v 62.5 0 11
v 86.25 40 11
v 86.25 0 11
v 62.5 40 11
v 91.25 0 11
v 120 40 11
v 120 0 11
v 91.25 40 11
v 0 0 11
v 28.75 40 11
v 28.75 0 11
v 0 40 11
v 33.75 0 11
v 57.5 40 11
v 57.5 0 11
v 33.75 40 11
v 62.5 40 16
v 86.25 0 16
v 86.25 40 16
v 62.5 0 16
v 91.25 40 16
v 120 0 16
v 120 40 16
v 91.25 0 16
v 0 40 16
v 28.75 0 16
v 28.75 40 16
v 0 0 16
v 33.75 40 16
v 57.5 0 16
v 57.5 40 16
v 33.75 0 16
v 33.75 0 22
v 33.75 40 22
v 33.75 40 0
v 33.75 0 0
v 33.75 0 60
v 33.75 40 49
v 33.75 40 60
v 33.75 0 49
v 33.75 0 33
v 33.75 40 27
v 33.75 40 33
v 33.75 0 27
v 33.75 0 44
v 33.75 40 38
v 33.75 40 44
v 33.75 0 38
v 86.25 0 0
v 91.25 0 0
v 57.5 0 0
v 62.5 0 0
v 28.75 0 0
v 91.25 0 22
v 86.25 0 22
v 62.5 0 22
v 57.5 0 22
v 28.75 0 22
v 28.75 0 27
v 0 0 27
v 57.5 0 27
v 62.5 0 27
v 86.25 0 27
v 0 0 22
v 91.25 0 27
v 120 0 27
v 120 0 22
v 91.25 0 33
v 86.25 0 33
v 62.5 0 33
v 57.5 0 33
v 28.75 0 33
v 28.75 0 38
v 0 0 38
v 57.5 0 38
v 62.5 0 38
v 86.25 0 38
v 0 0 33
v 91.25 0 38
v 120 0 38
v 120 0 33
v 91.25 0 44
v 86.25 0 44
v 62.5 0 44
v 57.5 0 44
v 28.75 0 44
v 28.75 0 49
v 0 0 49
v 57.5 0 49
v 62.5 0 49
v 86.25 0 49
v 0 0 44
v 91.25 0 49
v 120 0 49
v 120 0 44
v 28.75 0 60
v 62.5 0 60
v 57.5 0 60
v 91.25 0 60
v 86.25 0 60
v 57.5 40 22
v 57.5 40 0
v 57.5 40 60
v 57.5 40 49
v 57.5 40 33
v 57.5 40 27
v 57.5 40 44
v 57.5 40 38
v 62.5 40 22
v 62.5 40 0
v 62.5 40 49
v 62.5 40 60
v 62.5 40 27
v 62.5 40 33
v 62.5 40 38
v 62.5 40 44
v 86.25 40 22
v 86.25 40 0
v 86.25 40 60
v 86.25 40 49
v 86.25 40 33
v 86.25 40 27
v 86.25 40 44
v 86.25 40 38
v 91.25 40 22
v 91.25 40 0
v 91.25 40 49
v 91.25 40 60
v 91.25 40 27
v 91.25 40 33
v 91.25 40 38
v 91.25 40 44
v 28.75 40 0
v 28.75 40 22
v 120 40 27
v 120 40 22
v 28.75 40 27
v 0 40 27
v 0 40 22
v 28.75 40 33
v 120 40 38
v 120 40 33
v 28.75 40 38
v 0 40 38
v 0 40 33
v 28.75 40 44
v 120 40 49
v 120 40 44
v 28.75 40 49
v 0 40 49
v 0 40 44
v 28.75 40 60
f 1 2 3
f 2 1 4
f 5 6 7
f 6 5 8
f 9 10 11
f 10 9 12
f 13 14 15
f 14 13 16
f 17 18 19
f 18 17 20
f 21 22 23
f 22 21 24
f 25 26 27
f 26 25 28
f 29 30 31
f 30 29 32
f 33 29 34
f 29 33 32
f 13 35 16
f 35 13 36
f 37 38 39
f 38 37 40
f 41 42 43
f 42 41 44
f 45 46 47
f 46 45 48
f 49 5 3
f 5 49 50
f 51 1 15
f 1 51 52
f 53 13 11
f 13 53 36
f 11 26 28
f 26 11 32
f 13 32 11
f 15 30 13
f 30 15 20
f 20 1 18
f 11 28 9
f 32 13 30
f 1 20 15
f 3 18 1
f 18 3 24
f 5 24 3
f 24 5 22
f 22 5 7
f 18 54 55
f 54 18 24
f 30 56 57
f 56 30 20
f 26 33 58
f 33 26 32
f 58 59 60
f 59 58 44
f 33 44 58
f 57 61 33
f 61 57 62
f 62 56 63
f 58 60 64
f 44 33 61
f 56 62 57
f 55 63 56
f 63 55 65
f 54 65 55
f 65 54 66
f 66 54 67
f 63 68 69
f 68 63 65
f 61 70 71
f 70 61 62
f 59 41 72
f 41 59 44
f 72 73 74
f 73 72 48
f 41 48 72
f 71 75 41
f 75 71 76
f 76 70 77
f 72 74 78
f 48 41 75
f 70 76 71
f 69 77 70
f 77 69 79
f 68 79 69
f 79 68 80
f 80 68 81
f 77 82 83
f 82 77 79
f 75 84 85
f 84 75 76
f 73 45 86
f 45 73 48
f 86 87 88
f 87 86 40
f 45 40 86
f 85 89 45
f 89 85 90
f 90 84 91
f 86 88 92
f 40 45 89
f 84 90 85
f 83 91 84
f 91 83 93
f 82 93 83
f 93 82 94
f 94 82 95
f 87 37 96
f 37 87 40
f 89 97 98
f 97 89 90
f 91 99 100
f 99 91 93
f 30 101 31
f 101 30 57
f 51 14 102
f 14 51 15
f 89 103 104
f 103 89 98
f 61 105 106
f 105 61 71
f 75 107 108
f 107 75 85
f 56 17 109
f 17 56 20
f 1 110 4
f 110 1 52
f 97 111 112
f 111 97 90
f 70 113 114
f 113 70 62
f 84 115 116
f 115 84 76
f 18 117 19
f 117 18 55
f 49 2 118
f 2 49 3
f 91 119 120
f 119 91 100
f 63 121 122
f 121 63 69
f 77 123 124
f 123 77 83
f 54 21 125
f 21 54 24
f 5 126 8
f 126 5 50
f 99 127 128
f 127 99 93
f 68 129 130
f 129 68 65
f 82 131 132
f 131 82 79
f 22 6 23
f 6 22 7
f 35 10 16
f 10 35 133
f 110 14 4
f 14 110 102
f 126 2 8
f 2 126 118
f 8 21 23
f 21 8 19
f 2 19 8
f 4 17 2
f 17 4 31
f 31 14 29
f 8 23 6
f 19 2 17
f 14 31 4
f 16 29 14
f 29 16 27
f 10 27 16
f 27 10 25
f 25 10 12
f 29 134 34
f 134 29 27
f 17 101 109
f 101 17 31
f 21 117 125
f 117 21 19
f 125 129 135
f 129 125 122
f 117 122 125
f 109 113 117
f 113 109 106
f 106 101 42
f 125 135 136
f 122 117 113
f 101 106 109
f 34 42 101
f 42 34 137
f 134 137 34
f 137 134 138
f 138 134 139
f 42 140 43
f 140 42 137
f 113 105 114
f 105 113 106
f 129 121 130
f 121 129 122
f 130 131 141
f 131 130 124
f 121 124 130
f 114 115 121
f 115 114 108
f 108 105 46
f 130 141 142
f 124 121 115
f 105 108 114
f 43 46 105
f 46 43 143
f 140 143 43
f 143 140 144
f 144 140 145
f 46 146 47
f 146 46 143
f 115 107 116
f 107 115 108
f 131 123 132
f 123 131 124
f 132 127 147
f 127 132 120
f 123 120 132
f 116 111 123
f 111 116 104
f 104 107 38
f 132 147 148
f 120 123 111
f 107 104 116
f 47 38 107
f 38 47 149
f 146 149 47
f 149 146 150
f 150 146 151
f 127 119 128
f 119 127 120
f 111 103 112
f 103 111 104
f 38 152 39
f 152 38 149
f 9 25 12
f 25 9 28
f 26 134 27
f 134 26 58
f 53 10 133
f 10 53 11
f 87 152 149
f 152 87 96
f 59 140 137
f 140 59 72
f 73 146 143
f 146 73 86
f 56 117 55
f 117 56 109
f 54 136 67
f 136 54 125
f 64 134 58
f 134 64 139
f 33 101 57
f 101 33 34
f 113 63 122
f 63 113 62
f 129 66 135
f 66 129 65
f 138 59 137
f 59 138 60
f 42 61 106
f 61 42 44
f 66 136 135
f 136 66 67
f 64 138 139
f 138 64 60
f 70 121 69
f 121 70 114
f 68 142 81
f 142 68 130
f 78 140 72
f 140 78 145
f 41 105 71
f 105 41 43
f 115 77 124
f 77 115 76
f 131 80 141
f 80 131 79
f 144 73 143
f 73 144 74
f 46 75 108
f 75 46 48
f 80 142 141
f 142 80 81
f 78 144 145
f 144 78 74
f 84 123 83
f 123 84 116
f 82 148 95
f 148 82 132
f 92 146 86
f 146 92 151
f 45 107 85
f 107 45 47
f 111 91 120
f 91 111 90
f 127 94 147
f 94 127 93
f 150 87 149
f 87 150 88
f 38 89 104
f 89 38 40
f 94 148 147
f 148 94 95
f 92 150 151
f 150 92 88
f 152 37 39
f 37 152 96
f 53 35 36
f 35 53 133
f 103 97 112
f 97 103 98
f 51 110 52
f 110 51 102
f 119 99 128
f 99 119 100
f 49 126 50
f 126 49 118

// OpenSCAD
/*Compartments
Simple Script to generate Compartments for a rectangular container.
*/

//Settings
xNr = 5;
yNr = 4;
xD = 60;
yD = 120;
depth = 40;
thickness = 5;
end = 1;
margin = .001;

//Make Planes
module horizontalPlane() {
    linear_extrude(height=thickness)difference() {
        square([yD,depth]);
        for(i=[end:yNr-end])translate([i*(yD-thickness)/yNr,0])square([thickness,depth/2]);
    }
}
module verticalPlane() {
    linear_extrude(height=thickness)translate([xD,depth])rotate(a=[0,0,180])difference() {
        square([xD,depth]);
        for(i=[end:xNr-end])translate([i*(xD-thickness)/xNr,0])square([thickness,depth/2]);
    }
}

//Render
module render() {
    for(i=[end:xNr-end])translate([0,0,i*(xD-thickness)/xNr])horizontalPlane();
    for(i=[end:yNr-end])translate([i*(yD-thickness)/yNr,0,0])translate([0,0,xD])rotate([0,90,0])verticalPlane();
}    
//Export
module export() {
    for(i=[end:yNr-end])translate([yD+margin,i*(depth+margin),0])projection()verticalPlane();
    for(i=[end:xNr-end])translate([0,i*(depth+margin)])projection()horizontalPlane();
}

!render();
export();
